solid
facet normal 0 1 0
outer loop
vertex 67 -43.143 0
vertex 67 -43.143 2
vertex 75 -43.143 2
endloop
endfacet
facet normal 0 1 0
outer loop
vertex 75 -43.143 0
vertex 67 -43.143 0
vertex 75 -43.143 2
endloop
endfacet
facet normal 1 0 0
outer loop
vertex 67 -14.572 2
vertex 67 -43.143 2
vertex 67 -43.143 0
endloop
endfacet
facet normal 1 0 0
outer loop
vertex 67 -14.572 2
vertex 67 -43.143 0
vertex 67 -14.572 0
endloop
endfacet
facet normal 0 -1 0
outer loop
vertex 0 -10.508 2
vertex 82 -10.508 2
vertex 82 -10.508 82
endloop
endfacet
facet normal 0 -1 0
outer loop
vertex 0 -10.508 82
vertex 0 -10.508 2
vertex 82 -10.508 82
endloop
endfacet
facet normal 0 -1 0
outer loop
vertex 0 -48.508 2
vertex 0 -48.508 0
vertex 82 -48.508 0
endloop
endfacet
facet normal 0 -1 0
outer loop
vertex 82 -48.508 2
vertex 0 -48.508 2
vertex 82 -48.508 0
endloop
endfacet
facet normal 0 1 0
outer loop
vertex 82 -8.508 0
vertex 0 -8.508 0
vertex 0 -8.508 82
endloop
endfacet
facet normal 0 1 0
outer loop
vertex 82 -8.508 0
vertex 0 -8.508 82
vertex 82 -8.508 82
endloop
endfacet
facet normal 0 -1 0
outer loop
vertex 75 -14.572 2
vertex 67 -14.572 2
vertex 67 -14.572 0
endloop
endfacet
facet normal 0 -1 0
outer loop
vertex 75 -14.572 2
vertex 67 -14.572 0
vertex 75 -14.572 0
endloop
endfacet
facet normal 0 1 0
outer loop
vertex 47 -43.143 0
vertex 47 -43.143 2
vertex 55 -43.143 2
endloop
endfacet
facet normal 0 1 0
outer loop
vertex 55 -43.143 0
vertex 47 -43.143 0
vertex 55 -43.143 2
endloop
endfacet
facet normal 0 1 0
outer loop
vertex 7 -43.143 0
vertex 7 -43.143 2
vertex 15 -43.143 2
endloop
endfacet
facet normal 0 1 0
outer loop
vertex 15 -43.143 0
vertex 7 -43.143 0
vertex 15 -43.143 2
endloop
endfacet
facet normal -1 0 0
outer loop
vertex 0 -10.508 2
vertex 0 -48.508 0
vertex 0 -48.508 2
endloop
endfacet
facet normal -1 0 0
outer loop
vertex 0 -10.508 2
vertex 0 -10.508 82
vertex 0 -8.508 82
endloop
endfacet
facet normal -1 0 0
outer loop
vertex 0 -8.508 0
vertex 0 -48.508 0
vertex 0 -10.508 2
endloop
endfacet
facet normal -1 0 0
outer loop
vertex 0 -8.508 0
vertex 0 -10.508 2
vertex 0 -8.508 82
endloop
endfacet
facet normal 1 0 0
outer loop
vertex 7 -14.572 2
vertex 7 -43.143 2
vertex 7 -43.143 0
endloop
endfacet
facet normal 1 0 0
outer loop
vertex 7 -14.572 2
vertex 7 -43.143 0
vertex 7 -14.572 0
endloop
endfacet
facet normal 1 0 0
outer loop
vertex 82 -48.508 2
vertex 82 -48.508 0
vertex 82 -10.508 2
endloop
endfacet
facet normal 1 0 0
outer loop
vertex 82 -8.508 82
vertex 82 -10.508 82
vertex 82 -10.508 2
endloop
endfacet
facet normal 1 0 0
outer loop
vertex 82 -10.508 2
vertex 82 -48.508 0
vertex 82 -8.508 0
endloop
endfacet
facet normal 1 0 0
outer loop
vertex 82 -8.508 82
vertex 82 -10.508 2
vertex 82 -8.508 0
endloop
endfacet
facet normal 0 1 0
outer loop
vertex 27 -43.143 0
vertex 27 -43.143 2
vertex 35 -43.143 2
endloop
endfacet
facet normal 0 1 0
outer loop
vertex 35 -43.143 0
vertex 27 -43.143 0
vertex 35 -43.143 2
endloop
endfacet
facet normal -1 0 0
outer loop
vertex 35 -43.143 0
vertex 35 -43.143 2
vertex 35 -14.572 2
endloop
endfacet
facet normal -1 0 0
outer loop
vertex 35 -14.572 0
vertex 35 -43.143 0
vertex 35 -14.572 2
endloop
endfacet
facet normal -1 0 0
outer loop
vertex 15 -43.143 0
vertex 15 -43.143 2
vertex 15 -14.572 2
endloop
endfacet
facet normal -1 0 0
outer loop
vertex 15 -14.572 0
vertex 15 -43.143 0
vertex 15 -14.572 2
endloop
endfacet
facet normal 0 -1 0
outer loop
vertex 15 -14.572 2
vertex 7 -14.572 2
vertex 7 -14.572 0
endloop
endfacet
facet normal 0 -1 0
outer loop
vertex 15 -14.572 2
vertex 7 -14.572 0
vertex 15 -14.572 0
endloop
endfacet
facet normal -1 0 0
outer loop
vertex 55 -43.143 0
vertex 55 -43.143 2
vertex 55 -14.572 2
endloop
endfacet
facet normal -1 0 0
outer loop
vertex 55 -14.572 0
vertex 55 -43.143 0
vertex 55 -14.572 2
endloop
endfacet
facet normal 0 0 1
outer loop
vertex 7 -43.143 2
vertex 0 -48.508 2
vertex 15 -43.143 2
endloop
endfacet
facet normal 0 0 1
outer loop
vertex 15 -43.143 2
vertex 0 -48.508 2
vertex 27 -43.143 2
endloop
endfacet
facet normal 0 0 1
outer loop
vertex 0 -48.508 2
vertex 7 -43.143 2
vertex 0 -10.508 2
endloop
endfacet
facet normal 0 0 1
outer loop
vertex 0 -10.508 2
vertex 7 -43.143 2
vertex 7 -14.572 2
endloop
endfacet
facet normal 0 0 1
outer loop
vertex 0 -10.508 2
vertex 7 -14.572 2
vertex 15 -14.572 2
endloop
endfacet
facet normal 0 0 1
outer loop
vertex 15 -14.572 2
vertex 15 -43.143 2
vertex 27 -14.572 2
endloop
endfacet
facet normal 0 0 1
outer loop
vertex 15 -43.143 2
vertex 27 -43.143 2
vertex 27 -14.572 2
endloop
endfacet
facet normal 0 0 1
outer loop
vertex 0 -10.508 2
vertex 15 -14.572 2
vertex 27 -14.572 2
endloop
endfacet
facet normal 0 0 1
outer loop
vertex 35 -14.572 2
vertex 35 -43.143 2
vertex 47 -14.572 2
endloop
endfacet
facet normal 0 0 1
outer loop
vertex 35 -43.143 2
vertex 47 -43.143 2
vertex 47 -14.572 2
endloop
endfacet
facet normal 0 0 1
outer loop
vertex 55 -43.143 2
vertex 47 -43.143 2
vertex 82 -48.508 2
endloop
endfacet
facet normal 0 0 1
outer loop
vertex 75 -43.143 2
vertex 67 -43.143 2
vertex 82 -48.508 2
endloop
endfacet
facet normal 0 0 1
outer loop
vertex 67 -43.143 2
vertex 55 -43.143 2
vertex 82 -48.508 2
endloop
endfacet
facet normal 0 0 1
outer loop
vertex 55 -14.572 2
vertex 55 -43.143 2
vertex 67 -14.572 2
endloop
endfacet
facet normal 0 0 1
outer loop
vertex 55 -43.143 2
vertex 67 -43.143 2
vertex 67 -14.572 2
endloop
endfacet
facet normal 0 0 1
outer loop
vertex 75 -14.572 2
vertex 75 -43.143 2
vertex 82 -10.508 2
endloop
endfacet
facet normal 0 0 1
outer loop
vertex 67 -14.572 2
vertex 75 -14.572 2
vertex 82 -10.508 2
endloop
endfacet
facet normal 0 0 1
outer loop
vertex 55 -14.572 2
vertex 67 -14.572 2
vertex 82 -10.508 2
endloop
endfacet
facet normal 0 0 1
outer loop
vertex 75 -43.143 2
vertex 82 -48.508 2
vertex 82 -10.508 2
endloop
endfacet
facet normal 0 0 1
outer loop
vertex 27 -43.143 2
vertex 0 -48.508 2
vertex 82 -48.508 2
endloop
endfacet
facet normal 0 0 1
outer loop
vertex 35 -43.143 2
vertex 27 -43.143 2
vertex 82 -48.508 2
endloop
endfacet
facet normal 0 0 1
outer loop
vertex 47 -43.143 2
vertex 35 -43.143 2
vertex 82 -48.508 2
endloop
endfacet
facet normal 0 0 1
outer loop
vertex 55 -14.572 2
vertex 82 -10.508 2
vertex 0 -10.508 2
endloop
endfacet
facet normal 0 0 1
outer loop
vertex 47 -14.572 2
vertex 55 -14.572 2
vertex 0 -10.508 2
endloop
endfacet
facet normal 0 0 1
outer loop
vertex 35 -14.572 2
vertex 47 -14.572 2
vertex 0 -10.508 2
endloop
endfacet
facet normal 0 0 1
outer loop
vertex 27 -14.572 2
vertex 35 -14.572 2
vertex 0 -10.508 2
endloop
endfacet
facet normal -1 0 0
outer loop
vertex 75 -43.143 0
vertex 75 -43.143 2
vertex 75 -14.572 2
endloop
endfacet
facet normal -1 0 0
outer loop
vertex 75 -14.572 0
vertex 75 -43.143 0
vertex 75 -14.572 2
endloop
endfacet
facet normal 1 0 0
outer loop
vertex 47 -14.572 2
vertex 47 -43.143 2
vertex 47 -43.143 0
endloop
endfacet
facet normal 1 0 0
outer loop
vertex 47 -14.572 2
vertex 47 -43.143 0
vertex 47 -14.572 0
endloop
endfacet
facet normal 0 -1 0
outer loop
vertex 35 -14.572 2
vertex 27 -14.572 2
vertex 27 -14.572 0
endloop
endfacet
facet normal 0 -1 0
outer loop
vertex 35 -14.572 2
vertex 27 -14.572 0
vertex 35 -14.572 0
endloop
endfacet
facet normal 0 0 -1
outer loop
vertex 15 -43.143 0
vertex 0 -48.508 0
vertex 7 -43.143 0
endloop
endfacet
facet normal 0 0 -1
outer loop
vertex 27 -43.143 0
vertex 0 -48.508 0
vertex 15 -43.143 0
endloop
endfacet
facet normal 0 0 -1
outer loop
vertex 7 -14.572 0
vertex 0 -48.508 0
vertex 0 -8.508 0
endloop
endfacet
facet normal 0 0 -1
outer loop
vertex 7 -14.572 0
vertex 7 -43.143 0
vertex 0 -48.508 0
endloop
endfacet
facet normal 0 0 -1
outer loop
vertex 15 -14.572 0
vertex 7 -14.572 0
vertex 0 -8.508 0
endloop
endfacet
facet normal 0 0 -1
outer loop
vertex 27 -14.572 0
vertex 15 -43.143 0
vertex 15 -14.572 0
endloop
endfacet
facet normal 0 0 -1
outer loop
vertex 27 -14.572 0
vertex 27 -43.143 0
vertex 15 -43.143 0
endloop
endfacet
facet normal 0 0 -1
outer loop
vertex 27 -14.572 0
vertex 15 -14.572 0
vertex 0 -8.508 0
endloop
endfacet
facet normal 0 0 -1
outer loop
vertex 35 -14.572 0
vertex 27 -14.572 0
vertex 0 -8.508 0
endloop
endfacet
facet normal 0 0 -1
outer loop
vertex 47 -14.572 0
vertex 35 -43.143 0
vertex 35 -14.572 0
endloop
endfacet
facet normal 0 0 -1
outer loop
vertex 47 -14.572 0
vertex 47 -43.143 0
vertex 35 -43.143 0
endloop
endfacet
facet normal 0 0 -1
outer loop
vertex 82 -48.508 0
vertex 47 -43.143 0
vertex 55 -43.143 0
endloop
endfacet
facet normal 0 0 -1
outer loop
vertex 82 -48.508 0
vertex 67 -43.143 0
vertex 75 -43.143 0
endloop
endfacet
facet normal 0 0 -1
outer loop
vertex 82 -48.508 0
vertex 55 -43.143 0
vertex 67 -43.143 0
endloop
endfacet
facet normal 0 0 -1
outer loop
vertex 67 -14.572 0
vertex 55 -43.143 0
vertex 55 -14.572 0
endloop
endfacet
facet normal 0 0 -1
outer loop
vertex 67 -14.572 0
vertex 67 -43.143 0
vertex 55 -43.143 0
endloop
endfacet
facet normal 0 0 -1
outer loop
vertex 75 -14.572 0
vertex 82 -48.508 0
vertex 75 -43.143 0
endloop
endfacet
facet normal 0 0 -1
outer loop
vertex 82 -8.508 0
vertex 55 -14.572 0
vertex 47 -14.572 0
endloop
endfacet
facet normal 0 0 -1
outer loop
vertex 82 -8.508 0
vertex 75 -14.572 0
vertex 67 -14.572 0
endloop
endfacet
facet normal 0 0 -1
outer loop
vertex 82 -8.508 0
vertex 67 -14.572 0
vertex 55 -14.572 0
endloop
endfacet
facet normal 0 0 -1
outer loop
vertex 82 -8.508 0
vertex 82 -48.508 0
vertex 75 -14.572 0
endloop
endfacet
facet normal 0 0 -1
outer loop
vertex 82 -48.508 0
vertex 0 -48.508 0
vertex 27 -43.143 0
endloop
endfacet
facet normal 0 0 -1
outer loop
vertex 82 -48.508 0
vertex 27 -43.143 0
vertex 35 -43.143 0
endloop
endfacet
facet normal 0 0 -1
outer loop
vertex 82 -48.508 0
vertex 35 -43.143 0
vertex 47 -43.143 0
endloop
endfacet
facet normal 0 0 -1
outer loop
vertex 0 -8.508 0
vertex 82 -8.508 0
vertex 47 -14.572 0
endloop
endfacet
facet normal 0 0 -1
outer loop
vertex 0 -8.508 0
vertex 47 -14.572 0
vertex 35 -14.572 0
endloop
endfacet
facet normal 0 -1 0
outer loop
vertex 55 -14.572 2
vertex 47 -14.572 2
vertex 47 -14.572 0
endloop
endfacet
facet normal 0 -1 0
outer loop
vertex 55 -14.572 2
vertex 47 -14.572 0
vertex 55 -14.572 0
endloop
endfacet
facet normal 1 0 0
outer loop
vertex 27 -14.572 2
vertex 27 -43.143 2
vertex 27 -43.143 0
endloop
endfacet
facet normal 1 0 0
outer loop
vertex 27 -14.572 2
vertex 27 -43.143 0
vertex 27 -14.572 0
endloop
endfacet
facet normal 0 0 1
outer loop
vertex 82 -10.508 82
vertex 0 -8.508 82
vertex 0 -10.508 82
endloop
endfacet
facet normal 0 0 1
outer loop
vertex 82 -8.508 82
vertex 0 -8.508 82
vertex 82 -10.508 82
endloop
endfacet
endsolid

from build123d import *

# Parameters (mm, degrees)
F1_E0_W  = 40
F1_E0_H  = 82
F2_DEPTH = 2
F1_E1_W  = 82
F1_E1_H  = 82
F3_DEPTH = 2
F4_W     = 8
F4_H     = 28.5714303715
F5_DEPTH = 2.001


with BuildPart() as f2:
    # F1_E0 (on explicit) → F2 (new body)
    with BuildSketch(Plane(origin=(0, -48.5075005184, 0), x_dir=(0, 1, 0), z_dir=(0, 0, -1))):
        with Locations((20, 41)):
            Rectangle(F1_E0_W, F1_E0_H)
    extrude(amount=-F2_DEPTH)

    # F1_E1 (on explicit) → F3 (join)
    with BuildSketch(Plane.ZX.offset(-8.5075005184)):
        with Locations((41, 41)):
            Rectangle(F1_E1_W, F1_E1_H)
    extrude(amount=-F3_DEPTH)

    # F4 (on face) → F5 (cut, through all)
    with BuildSketch(Plane.XY.offset(2)):
        with Locations((71, -28.857444413)):
            Rectangle(F4_W, F4_H)
        with Locations((51, -28.857444413)):
            Rectangle(F4_W, F4_H)
        with Locations((31, -28.857444413)):
            Rectangle(F4_W, F4_H)
        with Locations((11, -28.857444413)):
            Rectangle(F4_W, F4_H)
    extrude(amount=-F5_DEPTH, mode=Mode.SUBTRACT)


solid = f2.part
